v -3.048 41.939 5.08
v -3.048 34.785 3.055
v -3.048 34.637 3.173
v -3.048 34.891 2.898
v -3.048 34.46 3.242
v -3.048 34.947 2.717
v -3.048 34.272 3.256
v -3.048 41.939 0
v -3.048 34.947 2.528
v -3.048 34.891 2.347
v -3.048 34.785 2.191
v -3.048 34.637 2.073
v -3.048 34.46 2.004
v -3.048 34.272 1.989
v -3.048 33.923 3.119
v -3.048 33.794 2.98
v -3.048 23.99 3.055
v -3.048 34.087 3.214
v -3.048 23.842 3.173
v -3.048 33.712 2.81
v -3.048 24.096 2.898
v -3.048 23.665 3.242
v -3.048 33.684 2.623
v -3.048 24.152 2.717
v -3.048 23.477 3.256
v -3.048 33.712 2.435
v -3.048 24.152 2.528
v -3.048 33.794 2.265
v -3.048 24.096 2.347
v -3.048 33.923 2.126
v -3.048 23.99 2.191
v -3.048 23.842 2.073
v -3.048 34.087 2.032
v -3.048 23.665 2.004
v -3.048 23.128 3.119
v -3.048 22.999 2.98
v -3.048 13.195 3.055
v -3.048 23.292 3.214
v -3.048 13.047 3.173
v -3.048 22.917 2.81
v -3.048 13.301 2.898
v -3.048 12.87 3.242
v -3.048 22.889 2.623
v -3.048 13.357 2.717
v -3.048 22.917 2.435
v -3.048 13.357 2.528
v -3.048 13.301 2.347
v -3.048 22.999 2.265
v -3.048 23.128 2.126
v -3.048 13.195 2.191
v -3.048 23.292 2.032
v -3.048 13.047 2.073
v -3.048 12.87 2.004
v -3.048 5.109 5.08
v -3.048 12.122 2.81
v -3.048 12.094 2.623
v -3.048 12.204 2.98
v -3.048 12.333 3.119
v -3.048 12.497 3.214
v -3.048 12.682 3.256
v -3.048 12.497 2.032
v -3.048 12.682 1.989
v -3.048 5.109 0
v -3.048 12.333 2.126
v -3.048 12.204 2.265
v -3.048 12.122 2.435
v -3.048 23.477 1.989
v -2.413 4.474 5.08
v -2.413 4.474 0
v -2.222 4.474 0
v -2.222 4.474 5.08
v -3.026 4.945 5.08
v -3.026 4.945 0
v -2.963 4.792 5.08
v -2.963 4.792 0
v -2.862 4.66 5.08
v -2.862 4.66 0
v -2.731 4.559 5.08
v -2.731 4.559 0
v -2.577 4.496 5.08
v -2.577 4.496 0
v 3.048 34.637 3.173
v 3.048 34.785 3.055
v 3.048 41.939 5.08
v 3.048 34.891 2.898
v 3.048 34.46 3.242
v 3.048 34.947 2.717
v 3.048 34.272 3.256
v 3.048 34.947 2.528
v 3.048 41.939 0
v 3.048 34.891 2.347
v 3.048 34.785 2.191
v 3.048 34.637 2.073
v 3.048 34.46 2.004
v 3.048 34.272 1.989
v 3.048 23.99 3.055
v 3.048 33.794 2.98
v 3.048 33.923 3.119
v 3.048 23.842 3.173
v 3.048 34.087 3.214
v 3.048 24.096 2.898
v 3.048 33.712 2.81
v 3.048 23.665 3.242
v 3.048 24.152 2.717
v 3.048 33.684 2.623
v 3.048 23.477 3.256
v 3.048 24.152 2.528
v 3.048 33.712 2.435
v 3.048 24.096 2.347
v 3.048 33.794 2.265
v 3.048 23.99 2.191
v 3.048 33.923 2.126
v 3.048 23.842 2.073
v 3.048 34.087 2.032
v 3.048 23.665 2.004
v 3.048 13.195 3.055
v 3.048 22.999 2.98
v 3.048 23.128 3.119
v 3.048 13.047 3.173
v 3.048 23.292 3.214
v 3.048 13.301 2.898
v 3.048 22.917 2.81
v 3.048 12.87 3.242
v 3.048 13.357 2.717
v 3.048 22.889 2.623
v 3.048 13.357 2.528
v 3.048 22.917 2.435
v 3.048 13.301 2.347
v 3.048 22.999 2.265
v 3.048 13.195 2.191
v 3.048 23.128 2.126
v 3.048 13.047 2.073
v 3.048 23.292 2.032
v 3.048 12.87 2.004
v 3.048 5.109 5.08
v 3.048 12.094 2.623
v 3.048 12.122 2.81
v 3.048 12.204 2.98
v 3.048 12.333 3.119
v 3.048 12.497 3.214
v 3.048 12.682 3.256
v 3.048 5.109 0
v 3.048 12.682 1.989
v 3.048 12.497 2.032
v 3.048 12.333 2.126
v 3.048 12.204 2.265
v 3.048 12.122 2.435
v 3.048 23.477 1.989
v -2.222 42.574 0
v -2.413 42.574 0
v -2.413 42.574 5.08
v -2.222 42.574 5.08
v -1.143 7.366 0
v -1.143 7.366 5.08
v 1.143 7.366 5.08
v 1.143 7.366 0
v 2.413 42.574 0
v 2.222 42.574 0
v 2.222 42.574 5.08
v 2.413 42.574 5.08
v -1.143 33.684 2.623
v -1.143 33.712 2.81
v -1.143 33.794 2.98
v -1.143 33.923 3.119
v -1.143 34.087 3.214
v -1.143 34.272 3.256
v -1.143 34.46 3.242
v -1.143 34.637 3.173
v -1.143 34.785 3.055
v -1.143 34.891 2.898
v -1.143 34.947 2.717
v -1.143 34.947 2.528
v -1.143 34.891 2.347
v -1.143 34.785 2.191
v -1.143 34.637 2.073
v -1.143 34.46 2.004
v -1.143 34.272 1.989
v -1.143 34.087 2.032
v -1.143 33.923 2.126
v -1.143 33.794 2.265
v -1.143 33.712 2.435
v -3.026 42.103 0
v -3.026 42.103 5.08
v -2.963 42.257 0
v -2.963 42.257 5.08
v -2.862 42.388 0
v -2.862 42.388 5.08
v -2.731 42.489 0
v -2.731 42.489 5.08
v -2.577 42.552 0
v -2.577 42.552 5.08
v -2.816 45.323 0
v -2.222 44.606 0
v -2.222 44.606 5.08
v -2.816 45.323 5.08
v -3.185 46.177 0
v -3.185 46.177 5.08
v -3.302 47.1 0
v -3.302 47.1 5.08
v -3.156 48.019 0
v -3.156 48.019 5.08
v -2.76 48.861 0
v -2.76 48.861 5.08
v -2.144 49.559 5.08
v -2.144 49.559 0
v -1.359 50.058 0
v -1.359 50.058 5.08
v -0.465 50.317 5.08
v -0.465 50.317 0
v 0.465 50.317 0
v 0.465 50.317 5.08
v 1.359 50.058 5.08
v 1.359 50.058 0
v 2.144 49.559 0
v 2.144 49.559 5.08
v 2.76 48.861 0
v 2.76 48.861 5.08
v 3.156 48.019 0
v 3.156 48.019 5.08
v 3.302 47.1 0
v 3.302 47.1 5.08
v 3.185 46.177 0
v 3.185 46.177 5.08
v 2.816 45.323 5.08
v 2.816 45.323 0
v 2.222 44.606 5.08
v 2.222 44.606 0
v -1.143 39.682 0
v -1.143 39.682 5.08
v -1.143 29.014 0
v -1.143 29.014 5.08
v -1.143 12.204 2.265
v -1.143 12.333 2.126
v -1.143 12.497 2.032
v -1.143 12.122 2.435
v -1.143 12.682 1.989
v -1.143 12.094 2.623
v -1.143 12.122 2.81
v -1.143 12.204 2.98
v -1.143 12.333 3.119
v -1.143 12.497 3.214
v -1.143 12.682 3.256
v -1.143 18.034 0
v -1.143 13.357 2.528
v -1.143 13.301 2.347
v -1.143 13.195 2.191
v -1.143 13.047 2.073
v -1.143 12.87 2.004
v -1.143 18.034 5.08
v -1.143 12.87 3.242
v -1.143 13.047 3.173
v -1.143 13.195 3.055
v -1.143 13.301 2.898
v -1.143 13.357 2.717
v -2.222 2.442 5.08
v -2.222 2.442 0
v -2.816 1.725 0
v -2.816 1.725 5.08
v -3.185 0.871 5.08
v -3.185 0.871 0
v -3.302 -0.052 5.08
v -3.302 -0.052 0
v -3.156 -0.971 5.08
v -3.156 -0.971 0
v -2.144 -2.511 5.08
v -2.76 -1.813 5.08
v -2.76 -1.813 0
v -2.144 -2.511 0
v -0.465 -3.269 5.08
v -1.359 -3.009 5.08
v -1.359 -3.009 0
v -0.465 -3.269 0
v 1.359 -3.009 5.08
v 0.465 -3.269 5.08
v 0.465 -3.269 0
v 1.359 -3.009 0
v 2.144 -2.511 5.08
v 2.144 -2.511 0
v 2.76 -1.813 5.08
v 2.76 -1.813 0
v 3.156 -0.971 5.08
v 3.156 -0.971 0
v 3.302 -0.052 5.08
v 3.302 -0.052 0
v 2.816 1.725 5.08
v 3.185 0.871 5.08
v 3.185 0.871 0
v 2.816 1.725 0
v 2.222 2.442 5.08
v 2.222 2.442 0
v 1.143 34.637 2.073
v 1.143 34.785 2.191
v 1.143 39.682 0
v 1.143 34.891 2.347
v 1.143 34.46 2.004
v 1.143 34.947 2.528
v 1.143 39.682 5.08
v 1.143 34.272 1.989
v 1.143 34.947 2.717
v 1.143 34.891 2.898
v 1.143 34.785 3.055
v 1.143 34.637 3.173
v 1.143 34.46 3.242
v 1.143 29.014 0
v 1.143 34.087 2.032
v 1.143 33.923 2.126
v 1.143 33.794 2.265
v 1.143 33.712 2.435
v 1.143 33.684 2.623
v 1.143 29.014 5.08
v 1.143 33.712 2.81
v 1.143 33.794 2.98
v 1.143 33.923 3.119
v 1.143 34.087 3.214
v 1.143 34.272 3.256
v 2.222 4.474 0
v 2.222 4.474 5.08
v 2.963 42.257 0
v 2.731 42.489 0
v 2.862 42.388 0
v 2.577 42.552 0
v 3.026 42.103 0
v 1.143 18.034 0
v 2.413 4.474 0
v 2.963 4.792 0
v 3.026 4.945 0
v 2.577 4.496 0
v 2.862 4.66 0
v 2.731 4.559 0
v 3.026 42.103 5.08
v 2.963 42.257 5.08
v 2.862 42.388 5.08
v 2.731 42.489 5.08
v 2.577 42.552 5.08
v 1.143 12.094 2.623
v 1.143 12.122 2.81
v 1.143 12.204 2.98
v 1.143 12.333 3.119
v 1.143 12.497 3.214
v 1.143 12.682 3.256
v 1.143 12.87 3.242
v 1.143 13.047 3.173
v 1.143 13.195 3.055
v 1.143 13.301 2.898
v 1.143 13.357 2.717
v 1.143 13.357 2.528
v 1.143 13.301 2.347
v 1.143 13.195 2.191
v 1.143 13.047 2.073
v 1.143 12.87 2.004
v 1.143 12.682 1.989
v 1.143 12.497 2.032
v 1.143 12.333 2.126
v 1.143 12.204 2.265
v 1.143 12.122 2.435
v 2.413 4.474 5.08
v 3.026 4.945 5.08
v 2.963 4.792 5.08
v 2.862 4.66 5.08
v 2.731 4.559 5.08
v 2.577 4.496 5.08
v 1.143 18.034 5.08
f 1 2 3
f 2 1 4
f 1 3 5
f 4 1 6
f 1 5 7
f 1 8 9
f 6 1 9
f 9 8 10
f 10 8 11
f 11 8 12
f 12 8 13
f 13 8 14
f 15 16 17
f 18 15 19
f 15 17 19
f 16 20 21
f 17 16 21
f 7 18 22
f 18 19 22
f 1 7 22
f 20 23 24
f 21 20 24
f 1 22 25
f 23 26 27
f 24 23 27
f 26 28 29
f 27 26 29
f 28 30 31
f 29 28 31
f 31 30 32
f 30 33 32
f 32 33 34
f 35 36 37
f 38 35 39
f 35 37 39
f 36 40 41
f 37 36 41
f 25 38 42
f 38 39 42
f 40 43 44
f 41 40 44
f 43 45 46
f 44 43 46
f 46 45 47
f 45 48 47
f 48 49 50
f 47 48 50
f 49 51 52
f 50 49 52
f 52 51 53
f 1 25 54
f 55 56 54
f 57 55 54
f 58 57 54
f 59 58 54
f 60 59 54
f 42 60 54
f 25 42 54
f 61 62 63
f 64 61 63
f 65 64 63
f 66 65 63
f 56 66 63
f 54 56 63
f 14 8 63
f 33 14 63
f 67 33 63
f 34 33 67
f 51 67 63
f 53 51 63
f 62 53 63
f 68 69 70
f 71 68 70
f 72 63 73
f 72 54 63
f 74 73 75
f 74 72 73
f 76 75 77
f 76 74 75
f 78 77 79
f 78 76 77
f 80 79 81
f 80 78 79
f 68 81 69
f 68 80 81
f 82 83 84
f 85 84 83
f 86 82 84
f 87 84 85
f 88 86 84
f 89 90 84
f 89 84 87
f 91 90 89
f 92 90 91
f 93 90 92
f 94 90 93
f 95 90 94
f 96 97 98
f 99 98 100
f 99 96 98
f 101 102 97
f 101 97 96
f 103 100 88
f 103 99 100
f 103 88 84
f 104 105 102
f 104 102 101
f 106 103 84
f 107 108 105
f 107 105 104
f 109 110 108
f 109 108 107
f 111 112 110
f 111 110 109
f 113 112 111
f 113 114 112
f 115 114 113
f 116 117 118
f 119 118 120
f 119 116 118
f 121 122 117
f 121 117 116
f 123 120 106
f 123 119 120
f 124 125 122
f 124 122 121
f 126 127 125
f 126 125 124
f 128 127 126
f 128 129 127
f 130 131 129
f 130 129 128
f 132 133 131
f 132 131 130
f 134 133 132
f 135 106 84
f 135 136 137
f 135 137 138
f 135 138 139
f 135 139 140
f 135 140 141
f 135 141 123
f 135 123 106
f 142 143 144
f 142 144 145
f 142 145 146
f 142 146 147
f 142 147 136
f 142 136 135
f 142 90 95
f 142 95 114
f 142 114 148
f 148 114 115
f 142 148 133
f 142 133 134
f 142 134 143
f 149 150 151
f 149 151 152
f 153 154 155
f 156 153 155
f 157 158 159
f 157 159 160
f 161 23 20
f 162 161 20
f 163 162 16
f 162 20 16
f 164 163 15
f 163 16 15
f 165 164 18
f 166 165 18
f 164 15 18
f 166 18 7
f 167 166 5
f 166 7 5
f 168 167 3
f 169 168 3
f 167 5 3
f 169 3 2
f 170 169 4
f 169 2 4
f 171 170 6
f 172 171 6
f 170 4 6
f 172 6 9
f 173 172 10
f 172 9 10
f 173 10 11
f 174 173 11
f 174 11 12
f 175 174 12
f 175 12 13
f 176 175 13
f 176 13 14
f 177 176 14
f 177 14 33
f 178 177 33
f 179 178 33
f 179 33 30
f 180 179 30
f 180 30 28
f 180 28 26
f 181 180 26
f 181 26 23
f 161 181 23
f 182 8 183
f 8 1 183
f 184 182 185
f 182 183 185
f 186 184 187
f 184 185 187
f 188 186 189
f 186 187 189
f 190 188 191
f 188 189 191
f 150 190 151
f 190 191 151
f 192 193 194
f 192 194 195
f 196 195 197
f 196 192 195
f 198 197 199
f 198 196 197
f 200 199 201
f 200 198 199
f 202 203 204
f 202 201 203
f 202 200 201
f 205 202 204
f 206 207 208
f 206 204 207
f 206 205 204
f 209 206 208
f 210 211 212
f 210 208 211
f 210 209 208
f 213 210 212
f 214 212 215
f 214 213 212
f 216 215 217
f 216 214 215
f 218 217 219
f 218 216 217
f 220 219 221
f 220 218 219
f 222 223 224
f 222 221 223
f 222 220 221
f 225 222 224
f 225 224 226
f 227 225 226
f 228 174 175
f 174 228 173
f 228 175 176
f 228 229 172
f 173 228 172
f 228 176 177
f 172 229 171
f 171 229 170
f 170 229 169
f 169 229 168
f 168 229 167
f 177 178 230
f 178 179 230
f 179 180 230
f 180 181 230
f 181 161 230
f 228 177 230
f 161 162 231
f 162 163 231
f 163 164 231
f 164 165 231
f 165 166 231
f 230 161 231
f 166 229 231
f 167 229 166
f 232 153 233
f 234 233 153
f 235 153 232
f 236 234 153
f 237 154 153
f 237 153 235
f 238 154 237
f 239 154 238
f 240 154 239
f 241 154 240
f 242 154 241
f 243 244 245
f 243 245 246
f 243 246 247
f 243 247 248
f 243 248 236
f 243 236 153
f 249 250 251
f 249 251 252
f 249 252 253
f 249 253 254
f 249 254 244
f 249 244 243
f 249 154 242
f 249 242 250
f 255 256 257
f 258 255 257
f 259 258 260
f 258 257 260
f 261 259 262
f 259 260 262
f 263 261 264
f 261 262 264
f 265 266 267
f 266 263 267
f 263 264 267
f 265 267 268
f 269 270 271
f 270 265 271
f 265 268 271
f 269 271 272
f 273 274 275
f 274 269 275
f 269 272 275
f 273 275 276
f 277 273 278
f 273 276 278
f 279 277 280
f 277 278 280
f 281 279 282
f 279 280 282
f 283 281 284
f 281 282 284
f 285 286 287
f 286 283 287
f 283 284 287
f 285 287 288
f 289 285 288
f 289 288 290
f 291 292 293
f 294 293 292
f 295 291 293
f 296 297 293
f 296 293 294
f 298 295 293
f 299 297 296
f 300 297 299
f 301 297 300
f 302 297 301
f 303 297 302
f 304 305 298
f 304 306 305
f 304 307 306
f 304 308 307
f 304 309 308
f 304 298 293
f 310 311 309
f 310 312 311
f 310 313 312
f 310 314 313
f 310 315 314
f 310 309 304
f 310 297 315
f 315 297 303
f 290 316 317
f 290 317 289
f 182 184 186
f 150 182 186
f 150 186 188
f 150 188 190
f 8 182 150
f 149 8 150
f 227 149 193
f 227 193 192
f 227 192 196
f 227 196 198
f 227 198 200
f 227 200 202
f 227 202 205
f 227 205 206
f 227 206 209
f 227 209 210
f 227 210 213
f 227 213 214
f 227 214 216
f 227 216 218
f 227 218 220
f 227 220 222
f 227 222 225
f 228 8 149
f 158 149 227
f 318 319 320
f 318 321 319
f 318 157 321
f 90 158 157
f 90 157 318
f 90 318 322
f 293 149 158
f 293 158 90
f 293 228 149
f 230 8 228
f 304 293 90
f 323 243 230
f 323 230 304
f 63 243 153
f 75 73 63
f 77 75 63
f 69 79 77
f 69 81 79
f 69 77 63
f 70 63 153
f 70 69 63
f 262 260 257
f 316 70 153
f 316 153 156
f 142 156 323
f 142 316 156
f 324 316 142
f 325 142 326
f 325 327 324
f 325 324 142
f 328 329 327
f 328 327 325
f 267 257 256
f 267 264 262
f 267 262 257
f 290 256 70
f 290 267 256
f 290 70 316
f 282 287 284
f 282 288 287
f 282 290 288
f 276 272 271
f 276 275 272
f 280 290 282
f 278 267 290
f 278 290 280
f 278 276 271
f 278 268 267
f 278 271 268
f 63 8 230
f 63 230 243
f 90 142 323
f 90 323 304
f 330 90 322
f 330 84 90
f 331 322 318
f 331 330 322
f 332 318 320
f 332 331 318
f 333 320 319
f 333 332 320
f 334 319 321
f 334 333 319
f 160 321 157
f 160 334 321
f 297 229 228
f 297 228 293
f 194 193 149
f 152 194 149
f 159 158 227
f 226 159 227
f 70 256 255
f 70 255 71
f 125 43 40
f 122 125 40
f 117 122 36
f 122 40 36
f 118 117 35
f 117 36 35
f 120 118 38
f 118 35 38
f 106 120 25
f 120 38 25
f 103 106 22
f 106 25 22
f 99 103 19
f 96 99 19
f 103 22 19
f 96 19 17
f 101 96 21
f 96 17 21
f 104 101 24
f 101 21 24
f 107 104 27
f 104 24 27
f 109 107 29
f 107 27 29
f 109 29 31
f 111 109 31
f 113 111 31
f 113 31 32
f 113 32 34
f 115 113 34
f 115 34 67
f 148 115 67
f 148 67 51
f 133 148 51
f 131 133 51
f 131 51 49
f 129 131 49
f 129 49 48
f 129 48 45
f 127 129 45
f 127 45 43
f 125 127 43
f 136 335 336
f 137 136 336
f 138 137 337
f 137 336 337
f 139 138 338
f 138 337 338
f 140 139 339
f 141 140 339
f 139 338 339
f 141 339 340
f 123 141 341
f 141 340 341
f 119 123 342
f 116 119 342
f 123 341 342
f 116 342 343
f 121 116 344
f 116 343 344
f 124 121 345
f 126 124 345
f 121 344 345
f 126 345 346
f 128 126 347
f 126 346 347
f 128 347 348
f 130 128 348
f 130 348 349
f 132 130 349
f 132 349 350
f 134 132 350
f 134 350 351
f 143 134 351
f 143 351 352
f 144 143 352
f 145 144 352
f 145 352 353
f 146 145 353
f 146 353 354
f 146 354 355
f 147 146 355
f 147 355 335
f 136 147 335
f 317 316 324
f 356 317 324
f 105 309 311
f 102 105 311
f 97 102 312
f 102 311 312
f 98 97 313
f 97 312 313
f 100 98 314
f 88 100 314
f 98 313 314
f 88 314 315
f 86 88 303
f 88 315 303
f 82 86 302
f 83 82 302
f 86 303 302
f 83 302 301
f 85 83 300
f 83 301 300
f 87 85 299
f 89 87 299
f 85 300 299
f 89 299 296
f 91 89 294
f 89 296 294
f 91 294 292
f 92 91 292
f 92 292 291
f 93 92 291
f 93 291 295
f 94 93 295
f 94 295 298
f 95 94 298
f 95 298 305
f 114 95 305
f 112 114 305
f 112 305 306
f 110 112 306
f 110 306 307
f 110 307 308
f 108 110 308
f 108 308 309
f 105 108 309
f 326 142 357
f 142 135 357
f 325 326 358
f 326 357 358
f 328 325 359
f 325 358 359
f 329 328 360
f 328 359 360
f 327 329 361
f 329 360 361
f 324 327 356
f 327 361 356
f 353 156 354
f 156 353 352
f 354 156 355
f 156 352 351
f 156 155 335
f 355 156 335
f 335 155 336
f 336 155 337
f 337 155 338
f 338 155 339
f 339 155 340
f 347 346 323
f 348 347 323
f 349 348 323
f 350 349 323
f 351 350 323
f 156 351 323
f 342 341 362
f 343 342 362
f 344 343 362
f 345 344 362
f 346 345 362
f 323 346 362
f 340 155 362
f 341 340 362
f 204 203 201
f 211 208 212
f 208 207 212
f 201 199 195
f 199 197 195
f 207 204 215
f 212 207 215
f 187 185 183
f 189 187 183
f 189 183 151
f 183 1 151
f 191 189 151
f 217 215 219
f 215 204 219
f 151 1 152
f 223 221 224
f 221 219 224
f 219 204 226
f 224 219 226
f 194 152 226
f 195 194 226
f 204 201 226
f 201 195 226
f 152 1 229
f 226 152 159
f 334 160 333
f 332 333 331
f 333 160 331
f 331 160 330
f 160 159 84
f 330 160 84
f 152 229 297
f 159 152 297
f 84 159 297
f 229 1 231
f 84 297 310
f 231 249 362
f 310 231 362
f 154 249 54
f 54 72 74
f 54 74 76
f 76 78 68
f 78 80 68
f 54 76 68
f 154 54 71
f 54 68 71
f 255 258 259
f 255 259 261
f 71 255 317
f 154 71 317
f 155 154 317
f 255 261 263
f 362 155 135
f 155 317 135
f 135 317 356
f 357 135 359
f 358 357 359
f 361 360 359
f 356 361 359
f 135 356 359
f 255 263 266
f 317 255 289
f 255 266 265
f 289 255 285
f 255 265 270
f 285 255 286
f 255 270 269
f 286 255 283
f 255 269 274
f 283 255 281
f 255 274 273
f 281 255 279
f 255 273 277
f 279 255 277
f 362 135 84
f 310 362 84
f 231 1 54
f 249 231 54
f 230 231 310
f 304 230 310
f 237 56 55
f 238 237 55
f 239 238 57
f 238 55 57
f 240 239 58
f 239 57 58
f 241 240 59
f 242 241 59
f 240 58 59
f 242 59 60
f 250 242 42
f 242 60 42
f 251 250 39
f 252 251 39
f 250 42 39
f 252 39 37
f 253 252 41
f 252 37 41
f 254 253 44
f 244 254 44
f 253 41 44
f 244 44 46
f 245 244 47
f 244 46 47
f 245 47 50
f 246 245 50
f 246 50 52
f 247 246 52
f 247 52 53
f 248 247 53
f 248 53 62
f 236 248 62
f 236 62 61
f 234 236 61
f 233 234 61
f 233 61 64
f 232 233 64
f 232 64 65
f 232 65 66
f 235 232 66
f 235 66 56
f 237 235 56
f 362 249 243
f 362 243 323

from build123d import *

# Parameters (mm, degrees)
F0_R     = 3.302
F1_DEPTH = 5.08
F3_DEPTH = 5.08
F4_W     = 6.096
F4_H     = 19.05
F5_DEPTH = 5.08
F6_R     = 0.635
F7_W     = 2.286
F7_H     = 10.668
F8_DEPTH = 25.4
F11_D    = 1.27


with BuildPart() as f1:
    # F0 (on Top) → F1 (new body)
    with BuildSketch(Plane.XY):
        Circle(F0_R)
    extrude(amount=F1_DEPTH)

    # F2 (on face) → F3 (join, through all)
    with BuildSketch(Plane(origin=(0, 0, 0), x_dir=(1, 0, 0), z_dir=(0, 0, -1))):
        with BuildLine():
            ThreePointArc((2.2225, -2.442068), (0, -3.302), (-2.2225, -2.442068))
            Line((-2.2225, -2.442068), (-2.2225, -4.474068))
            Line((-2.2225, -4.474068), (2.2225, -4.474068))
            Line((2.2225, -4.474068), (2.2225, -2.442068))
        make_face()
    extrude(amount=-F3_DEPTH)

    # F4 (on Top) → F5 (join, through all)
    with BuildSketch(Plane.XY):
        with Locations((0, 13.999068)):
            Rectangle(F4_W, F4_H)
    extrude(amount=F5_DEPTH)

    # F6
    f6_edges = [f1.edges().sort_by_distance(p)[0] for p in [
        (3.048, 4.474068, 2.54),
        (-3.048, 4.474068, 2.54),
    ]]
    fillet(f6_edges, radius=F6_R)

    # F7 (on face) → F8 (cut)
    with BuildSketch(Plane.XY.offset(5.08)):
        with Locations((0, 12.7)):
            Rectangle(F7_W, F7_H)
    extrude(amount=-F8_DEPTH, mode=Mode.SUBTRACT)

    # F9: F1 across face


with BuildPart() as f1_1:
    add(f1.part)
    add(f1.part.mirror(Plane(origin=(0, 23.524068, 2.54), x_dir=(-1, 0, 0), z_dir=(0, 1, 0))))

    # F11 (through all)
    with Locations(Plane.YZ.offset(3.048)):
        with Locations((12.729068, 2.622667), (23.524068, 2.622667), (34.319068, 2.622667)):
            Hole(F11_D / 2)


solid = f1_1.part
